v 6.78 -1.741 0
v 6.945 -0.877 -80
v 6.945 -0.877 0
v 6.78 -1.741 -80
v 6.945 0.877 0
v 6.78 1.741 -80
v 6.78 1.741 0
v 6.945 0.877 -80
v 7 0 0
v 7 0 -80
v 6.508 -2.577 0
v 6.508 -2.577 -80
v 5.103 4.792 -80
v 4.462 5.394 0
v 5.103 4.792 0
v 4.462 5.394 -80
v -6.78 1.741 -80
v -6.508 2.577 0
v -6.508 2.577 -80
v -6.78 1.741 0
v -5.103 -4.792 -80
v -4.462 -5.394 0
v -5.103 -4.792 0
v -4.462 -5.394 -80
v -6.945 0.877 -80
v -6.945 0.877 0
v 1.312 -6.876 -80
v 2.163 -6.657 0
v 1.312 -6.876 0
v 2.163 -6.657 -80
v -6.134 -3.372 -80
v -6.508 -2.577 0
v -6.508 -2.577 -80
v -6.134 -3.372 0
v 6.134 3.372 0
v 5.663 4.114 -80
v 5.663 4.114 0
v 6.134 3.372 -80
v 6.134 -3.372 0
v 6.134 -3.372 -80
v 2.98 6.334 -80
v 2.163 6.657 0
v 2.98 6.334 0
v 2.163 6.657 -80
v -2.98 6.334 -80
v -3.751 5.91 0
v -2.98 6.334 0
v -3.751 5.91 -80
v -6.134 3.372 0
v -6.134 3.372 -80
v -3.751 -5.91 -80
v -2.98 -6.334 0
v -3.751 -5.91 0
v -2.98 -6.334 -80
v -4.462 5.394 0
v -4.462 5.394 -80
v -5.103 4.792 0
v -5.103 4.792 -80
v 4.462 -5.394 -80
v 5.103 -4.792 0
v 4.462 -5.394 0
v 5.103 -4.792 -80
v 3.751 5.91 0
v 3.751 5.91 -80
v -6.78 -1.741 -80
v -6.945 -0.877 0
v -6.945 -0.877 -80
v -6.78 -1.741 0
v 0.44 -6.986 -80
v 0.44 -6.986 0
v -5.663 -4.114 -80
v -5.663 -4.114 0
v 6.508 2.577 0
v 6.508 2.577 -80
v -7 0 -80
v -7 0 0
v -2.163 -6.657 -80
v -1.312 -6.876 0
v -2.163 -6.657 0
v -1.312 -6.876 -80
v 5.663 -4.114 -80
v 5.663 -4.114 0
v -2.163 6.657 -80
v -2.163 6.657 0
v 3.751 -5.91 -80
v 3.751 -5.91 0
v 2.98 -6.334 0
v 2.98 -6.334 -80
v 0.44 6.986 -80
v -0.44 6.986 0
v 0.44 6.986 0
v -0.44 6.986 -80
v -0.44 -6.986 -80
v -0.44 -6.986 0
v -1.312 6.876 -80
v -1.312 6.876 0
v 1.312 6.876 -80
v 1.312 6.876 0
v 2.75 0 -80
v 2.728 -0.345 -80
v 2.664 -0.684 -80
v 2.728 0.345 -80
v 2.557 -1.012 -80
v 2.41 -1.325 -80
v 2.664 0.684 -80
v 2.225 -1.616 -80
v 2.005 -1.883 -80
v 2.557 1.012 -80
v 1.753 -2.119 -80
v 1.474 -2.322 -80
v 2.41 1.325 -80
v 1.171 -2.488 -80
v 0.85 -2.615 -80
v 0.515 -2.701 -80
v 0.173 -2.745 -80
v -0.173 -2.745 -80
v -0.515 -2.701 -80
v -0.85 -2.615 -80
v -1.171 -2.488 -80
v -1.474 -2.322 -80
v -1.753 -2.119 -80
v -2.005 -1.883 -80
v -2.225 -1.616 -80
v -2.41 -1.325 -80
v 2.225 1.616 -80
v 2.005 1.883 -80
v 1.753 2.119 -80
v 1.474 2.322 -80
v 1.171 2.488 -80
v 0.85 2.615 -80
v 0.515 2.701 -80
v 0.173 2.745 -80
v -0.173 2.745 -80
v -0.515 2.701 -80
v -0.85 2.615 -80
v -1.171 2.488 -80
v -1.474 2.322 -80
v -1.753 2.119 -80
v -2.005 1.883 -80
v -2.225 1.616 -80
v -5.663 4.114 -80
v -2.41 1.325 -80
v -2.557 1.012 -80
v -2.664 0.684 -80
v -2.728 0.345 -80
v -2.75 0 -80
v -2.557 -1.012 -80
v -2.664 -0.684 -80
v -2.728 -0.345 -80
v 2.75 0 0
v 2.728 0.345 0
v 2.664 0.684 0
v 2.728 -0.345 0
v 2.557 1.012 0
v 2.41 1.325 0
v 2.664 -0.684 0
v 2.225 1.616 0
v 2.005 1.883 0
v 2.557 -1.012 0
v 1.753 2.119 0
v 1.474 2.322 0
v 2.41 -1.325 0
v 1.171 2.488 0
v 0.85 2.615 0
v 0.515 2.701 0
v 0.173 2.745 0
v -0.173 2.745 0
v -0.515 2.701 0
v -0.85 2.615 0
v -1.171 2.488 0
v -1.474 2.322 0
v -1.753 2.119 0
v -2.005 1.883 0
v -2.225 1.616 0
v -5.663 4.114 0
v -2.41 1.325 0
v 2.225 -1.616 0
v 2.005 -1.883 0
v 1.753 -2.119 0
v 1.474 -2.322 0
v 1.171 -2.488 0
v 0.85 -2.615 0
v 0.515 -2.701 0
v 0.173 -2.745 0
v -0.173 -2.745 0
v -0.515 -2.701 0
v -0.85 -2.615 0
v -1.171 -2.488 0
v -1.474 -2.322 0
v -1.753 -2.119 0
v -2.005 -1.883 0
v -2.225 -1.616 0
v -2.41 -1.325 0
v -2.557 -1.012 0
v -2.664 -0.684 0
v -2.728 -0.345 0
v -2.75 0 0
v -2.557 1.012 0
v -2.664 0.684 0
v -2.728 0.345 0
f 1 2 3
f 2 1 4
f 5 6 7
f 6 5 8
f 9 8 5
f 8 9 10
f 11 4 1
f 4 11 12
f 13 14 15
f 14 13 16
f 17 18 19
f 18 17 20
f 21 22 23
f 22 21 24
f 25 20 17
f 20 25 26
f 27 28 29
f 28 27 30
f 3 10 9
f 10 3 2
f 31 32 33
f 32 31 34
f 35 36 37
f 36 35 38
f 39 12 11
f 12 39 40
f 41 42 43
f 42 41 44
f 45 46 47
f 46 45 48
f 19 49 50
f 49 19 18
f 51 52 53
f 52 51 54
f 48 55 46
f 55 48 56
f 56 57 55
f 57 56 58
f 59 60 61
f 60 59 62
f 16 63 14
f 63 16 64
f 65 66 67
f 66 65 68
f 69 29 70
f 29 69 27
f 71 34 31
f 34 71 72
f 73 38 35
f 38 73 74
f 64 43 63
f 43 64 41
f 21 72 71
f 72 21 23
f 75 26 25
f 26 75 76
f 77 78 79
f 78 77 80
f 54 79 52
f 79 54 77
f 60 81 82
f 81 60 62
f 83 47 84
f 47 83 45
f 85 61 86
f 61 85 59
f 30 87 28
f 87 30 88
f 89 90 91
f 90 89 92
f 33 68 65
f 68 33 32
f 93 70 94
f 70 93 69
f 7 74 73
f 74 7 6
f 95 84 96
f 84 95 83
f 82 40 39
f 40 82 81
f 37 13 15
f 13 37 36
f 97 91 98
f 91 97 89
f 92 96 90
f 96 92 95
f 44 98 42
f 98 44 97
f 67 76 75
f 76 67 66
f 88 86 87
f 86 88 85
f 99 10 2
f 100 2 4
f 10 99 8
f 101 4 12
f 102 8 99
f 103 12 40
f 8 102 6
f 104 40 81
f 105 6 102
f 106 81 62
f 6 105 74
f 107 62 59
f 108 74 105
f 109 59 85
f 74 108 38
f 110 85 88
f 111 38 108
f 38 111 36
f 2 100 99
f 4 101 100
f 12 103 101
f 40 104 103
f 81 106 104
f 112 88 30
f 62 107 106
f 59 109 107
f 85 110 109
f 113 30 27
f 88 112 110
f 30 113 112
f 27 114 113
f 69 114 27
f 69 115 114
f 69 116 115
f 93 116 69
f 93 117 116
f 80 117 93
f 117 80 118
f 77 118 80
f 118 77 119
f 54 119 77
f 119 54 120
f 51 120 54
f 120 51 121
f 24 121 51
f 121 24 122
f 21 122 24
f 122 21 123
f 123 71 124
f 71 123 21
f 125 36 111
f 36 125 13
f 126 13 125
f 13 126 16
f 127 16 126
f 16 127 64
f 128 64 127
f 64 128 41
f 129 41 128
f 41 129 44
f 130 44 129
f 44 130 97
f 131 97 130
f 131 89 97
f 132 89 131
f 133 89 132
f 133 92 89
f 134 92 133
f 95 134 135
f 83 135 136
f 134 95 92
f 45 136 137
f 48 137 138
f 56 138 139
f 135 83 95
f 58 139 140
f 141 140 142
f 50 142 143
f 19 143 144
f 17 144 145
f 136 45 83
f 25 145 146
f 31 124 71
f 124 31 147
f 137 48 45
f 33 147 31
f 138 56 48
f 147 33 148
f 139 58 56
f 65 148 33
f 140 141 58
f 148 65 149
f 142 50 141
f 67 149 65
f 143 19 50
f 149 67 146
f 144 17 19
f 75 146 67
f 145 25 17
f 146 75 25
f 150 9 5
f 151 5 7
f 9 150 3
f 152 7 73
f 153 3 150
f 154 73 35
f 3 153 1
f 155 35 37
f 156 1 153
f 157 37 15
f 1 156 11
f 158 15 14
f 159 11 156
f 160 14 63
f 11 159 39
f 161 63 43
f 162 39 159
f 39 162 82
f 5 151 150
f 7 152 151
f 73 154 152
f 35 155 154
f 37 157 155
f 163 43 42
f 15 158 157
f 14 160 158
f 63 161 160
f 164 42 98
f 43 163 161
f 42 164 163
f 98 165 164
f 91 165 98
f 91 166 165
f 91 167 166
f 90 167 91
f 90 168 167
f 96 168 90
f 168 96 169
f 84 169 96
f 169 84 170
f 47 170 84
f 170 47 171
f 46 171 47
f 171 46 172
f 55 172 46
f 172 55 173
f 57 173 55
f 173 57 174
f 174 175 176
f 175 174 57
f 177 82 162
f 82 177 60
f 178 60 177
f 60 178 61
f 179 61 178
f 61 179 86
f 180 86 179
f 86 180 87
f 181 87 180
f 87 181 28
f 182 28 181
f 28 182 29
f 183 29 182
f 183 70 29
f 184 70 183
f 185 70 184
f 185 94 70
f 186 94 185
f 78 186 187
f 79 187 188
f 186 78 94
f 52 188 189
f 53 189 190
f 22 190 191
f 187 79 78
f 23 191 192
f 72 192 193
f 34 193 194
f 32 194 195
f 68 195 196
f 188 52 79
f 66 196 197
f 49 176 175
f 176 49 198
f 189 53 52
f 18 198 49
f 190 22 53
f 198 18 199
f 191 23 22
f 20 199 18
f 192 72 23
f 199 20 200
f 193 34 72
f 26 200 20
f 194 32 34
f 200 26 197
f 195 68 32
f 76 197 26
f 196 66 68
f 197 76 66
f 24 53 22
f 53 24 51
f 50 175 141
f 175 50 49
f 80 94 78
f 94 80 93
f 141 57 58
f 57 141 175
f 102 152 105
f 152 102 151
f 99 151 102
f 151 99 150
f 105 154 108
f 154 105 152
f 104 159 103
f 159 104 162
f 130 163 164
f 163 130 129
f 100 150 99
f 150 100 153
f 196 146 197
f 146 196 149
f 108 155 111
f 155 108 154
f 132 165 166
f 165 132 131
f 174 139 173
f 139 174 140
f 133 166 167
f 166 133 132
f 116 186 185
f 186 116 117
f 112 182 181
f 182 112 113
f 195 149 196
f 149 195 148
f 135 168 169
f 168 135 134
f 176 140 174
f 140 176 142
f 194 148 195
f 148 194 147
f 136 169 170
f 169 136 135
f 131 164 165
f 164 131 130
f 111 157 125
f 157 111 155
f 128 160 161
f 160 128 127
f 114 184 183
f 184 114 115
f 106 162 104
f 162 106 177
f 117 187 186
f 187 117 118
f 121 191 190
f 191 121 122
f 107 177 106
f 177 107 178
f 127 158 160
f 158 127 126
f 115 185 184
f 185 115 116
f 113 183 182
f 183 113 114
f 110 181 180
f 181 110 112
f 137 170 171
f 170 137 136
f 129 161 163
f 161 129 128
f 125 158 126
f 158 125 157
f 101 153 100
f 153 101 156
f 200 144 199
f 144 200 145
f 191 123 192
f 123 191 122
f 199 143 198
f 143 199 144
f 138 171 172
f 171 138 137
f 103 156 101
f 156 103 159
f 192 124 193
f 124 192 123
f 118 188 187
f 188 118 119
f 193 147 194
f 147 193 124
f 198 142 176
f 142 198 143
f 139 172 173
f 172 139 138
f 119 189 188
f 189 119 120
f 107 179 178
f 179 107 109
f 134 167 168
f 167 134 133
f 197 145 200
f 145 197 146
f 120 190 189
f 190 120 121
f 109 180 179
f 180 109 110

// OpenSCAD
$fn = 50;


difference() {
	union() {
		translate(v = [0, 0, -80.0000000000]) {
			cylinder(h = 80, r = 7.0000000000);
		}
	}
	union() {
		#translate(v = [0, 0, -80]) {
			cylinder(h = 80, r = 2.7500000000);
		}
	}
}
